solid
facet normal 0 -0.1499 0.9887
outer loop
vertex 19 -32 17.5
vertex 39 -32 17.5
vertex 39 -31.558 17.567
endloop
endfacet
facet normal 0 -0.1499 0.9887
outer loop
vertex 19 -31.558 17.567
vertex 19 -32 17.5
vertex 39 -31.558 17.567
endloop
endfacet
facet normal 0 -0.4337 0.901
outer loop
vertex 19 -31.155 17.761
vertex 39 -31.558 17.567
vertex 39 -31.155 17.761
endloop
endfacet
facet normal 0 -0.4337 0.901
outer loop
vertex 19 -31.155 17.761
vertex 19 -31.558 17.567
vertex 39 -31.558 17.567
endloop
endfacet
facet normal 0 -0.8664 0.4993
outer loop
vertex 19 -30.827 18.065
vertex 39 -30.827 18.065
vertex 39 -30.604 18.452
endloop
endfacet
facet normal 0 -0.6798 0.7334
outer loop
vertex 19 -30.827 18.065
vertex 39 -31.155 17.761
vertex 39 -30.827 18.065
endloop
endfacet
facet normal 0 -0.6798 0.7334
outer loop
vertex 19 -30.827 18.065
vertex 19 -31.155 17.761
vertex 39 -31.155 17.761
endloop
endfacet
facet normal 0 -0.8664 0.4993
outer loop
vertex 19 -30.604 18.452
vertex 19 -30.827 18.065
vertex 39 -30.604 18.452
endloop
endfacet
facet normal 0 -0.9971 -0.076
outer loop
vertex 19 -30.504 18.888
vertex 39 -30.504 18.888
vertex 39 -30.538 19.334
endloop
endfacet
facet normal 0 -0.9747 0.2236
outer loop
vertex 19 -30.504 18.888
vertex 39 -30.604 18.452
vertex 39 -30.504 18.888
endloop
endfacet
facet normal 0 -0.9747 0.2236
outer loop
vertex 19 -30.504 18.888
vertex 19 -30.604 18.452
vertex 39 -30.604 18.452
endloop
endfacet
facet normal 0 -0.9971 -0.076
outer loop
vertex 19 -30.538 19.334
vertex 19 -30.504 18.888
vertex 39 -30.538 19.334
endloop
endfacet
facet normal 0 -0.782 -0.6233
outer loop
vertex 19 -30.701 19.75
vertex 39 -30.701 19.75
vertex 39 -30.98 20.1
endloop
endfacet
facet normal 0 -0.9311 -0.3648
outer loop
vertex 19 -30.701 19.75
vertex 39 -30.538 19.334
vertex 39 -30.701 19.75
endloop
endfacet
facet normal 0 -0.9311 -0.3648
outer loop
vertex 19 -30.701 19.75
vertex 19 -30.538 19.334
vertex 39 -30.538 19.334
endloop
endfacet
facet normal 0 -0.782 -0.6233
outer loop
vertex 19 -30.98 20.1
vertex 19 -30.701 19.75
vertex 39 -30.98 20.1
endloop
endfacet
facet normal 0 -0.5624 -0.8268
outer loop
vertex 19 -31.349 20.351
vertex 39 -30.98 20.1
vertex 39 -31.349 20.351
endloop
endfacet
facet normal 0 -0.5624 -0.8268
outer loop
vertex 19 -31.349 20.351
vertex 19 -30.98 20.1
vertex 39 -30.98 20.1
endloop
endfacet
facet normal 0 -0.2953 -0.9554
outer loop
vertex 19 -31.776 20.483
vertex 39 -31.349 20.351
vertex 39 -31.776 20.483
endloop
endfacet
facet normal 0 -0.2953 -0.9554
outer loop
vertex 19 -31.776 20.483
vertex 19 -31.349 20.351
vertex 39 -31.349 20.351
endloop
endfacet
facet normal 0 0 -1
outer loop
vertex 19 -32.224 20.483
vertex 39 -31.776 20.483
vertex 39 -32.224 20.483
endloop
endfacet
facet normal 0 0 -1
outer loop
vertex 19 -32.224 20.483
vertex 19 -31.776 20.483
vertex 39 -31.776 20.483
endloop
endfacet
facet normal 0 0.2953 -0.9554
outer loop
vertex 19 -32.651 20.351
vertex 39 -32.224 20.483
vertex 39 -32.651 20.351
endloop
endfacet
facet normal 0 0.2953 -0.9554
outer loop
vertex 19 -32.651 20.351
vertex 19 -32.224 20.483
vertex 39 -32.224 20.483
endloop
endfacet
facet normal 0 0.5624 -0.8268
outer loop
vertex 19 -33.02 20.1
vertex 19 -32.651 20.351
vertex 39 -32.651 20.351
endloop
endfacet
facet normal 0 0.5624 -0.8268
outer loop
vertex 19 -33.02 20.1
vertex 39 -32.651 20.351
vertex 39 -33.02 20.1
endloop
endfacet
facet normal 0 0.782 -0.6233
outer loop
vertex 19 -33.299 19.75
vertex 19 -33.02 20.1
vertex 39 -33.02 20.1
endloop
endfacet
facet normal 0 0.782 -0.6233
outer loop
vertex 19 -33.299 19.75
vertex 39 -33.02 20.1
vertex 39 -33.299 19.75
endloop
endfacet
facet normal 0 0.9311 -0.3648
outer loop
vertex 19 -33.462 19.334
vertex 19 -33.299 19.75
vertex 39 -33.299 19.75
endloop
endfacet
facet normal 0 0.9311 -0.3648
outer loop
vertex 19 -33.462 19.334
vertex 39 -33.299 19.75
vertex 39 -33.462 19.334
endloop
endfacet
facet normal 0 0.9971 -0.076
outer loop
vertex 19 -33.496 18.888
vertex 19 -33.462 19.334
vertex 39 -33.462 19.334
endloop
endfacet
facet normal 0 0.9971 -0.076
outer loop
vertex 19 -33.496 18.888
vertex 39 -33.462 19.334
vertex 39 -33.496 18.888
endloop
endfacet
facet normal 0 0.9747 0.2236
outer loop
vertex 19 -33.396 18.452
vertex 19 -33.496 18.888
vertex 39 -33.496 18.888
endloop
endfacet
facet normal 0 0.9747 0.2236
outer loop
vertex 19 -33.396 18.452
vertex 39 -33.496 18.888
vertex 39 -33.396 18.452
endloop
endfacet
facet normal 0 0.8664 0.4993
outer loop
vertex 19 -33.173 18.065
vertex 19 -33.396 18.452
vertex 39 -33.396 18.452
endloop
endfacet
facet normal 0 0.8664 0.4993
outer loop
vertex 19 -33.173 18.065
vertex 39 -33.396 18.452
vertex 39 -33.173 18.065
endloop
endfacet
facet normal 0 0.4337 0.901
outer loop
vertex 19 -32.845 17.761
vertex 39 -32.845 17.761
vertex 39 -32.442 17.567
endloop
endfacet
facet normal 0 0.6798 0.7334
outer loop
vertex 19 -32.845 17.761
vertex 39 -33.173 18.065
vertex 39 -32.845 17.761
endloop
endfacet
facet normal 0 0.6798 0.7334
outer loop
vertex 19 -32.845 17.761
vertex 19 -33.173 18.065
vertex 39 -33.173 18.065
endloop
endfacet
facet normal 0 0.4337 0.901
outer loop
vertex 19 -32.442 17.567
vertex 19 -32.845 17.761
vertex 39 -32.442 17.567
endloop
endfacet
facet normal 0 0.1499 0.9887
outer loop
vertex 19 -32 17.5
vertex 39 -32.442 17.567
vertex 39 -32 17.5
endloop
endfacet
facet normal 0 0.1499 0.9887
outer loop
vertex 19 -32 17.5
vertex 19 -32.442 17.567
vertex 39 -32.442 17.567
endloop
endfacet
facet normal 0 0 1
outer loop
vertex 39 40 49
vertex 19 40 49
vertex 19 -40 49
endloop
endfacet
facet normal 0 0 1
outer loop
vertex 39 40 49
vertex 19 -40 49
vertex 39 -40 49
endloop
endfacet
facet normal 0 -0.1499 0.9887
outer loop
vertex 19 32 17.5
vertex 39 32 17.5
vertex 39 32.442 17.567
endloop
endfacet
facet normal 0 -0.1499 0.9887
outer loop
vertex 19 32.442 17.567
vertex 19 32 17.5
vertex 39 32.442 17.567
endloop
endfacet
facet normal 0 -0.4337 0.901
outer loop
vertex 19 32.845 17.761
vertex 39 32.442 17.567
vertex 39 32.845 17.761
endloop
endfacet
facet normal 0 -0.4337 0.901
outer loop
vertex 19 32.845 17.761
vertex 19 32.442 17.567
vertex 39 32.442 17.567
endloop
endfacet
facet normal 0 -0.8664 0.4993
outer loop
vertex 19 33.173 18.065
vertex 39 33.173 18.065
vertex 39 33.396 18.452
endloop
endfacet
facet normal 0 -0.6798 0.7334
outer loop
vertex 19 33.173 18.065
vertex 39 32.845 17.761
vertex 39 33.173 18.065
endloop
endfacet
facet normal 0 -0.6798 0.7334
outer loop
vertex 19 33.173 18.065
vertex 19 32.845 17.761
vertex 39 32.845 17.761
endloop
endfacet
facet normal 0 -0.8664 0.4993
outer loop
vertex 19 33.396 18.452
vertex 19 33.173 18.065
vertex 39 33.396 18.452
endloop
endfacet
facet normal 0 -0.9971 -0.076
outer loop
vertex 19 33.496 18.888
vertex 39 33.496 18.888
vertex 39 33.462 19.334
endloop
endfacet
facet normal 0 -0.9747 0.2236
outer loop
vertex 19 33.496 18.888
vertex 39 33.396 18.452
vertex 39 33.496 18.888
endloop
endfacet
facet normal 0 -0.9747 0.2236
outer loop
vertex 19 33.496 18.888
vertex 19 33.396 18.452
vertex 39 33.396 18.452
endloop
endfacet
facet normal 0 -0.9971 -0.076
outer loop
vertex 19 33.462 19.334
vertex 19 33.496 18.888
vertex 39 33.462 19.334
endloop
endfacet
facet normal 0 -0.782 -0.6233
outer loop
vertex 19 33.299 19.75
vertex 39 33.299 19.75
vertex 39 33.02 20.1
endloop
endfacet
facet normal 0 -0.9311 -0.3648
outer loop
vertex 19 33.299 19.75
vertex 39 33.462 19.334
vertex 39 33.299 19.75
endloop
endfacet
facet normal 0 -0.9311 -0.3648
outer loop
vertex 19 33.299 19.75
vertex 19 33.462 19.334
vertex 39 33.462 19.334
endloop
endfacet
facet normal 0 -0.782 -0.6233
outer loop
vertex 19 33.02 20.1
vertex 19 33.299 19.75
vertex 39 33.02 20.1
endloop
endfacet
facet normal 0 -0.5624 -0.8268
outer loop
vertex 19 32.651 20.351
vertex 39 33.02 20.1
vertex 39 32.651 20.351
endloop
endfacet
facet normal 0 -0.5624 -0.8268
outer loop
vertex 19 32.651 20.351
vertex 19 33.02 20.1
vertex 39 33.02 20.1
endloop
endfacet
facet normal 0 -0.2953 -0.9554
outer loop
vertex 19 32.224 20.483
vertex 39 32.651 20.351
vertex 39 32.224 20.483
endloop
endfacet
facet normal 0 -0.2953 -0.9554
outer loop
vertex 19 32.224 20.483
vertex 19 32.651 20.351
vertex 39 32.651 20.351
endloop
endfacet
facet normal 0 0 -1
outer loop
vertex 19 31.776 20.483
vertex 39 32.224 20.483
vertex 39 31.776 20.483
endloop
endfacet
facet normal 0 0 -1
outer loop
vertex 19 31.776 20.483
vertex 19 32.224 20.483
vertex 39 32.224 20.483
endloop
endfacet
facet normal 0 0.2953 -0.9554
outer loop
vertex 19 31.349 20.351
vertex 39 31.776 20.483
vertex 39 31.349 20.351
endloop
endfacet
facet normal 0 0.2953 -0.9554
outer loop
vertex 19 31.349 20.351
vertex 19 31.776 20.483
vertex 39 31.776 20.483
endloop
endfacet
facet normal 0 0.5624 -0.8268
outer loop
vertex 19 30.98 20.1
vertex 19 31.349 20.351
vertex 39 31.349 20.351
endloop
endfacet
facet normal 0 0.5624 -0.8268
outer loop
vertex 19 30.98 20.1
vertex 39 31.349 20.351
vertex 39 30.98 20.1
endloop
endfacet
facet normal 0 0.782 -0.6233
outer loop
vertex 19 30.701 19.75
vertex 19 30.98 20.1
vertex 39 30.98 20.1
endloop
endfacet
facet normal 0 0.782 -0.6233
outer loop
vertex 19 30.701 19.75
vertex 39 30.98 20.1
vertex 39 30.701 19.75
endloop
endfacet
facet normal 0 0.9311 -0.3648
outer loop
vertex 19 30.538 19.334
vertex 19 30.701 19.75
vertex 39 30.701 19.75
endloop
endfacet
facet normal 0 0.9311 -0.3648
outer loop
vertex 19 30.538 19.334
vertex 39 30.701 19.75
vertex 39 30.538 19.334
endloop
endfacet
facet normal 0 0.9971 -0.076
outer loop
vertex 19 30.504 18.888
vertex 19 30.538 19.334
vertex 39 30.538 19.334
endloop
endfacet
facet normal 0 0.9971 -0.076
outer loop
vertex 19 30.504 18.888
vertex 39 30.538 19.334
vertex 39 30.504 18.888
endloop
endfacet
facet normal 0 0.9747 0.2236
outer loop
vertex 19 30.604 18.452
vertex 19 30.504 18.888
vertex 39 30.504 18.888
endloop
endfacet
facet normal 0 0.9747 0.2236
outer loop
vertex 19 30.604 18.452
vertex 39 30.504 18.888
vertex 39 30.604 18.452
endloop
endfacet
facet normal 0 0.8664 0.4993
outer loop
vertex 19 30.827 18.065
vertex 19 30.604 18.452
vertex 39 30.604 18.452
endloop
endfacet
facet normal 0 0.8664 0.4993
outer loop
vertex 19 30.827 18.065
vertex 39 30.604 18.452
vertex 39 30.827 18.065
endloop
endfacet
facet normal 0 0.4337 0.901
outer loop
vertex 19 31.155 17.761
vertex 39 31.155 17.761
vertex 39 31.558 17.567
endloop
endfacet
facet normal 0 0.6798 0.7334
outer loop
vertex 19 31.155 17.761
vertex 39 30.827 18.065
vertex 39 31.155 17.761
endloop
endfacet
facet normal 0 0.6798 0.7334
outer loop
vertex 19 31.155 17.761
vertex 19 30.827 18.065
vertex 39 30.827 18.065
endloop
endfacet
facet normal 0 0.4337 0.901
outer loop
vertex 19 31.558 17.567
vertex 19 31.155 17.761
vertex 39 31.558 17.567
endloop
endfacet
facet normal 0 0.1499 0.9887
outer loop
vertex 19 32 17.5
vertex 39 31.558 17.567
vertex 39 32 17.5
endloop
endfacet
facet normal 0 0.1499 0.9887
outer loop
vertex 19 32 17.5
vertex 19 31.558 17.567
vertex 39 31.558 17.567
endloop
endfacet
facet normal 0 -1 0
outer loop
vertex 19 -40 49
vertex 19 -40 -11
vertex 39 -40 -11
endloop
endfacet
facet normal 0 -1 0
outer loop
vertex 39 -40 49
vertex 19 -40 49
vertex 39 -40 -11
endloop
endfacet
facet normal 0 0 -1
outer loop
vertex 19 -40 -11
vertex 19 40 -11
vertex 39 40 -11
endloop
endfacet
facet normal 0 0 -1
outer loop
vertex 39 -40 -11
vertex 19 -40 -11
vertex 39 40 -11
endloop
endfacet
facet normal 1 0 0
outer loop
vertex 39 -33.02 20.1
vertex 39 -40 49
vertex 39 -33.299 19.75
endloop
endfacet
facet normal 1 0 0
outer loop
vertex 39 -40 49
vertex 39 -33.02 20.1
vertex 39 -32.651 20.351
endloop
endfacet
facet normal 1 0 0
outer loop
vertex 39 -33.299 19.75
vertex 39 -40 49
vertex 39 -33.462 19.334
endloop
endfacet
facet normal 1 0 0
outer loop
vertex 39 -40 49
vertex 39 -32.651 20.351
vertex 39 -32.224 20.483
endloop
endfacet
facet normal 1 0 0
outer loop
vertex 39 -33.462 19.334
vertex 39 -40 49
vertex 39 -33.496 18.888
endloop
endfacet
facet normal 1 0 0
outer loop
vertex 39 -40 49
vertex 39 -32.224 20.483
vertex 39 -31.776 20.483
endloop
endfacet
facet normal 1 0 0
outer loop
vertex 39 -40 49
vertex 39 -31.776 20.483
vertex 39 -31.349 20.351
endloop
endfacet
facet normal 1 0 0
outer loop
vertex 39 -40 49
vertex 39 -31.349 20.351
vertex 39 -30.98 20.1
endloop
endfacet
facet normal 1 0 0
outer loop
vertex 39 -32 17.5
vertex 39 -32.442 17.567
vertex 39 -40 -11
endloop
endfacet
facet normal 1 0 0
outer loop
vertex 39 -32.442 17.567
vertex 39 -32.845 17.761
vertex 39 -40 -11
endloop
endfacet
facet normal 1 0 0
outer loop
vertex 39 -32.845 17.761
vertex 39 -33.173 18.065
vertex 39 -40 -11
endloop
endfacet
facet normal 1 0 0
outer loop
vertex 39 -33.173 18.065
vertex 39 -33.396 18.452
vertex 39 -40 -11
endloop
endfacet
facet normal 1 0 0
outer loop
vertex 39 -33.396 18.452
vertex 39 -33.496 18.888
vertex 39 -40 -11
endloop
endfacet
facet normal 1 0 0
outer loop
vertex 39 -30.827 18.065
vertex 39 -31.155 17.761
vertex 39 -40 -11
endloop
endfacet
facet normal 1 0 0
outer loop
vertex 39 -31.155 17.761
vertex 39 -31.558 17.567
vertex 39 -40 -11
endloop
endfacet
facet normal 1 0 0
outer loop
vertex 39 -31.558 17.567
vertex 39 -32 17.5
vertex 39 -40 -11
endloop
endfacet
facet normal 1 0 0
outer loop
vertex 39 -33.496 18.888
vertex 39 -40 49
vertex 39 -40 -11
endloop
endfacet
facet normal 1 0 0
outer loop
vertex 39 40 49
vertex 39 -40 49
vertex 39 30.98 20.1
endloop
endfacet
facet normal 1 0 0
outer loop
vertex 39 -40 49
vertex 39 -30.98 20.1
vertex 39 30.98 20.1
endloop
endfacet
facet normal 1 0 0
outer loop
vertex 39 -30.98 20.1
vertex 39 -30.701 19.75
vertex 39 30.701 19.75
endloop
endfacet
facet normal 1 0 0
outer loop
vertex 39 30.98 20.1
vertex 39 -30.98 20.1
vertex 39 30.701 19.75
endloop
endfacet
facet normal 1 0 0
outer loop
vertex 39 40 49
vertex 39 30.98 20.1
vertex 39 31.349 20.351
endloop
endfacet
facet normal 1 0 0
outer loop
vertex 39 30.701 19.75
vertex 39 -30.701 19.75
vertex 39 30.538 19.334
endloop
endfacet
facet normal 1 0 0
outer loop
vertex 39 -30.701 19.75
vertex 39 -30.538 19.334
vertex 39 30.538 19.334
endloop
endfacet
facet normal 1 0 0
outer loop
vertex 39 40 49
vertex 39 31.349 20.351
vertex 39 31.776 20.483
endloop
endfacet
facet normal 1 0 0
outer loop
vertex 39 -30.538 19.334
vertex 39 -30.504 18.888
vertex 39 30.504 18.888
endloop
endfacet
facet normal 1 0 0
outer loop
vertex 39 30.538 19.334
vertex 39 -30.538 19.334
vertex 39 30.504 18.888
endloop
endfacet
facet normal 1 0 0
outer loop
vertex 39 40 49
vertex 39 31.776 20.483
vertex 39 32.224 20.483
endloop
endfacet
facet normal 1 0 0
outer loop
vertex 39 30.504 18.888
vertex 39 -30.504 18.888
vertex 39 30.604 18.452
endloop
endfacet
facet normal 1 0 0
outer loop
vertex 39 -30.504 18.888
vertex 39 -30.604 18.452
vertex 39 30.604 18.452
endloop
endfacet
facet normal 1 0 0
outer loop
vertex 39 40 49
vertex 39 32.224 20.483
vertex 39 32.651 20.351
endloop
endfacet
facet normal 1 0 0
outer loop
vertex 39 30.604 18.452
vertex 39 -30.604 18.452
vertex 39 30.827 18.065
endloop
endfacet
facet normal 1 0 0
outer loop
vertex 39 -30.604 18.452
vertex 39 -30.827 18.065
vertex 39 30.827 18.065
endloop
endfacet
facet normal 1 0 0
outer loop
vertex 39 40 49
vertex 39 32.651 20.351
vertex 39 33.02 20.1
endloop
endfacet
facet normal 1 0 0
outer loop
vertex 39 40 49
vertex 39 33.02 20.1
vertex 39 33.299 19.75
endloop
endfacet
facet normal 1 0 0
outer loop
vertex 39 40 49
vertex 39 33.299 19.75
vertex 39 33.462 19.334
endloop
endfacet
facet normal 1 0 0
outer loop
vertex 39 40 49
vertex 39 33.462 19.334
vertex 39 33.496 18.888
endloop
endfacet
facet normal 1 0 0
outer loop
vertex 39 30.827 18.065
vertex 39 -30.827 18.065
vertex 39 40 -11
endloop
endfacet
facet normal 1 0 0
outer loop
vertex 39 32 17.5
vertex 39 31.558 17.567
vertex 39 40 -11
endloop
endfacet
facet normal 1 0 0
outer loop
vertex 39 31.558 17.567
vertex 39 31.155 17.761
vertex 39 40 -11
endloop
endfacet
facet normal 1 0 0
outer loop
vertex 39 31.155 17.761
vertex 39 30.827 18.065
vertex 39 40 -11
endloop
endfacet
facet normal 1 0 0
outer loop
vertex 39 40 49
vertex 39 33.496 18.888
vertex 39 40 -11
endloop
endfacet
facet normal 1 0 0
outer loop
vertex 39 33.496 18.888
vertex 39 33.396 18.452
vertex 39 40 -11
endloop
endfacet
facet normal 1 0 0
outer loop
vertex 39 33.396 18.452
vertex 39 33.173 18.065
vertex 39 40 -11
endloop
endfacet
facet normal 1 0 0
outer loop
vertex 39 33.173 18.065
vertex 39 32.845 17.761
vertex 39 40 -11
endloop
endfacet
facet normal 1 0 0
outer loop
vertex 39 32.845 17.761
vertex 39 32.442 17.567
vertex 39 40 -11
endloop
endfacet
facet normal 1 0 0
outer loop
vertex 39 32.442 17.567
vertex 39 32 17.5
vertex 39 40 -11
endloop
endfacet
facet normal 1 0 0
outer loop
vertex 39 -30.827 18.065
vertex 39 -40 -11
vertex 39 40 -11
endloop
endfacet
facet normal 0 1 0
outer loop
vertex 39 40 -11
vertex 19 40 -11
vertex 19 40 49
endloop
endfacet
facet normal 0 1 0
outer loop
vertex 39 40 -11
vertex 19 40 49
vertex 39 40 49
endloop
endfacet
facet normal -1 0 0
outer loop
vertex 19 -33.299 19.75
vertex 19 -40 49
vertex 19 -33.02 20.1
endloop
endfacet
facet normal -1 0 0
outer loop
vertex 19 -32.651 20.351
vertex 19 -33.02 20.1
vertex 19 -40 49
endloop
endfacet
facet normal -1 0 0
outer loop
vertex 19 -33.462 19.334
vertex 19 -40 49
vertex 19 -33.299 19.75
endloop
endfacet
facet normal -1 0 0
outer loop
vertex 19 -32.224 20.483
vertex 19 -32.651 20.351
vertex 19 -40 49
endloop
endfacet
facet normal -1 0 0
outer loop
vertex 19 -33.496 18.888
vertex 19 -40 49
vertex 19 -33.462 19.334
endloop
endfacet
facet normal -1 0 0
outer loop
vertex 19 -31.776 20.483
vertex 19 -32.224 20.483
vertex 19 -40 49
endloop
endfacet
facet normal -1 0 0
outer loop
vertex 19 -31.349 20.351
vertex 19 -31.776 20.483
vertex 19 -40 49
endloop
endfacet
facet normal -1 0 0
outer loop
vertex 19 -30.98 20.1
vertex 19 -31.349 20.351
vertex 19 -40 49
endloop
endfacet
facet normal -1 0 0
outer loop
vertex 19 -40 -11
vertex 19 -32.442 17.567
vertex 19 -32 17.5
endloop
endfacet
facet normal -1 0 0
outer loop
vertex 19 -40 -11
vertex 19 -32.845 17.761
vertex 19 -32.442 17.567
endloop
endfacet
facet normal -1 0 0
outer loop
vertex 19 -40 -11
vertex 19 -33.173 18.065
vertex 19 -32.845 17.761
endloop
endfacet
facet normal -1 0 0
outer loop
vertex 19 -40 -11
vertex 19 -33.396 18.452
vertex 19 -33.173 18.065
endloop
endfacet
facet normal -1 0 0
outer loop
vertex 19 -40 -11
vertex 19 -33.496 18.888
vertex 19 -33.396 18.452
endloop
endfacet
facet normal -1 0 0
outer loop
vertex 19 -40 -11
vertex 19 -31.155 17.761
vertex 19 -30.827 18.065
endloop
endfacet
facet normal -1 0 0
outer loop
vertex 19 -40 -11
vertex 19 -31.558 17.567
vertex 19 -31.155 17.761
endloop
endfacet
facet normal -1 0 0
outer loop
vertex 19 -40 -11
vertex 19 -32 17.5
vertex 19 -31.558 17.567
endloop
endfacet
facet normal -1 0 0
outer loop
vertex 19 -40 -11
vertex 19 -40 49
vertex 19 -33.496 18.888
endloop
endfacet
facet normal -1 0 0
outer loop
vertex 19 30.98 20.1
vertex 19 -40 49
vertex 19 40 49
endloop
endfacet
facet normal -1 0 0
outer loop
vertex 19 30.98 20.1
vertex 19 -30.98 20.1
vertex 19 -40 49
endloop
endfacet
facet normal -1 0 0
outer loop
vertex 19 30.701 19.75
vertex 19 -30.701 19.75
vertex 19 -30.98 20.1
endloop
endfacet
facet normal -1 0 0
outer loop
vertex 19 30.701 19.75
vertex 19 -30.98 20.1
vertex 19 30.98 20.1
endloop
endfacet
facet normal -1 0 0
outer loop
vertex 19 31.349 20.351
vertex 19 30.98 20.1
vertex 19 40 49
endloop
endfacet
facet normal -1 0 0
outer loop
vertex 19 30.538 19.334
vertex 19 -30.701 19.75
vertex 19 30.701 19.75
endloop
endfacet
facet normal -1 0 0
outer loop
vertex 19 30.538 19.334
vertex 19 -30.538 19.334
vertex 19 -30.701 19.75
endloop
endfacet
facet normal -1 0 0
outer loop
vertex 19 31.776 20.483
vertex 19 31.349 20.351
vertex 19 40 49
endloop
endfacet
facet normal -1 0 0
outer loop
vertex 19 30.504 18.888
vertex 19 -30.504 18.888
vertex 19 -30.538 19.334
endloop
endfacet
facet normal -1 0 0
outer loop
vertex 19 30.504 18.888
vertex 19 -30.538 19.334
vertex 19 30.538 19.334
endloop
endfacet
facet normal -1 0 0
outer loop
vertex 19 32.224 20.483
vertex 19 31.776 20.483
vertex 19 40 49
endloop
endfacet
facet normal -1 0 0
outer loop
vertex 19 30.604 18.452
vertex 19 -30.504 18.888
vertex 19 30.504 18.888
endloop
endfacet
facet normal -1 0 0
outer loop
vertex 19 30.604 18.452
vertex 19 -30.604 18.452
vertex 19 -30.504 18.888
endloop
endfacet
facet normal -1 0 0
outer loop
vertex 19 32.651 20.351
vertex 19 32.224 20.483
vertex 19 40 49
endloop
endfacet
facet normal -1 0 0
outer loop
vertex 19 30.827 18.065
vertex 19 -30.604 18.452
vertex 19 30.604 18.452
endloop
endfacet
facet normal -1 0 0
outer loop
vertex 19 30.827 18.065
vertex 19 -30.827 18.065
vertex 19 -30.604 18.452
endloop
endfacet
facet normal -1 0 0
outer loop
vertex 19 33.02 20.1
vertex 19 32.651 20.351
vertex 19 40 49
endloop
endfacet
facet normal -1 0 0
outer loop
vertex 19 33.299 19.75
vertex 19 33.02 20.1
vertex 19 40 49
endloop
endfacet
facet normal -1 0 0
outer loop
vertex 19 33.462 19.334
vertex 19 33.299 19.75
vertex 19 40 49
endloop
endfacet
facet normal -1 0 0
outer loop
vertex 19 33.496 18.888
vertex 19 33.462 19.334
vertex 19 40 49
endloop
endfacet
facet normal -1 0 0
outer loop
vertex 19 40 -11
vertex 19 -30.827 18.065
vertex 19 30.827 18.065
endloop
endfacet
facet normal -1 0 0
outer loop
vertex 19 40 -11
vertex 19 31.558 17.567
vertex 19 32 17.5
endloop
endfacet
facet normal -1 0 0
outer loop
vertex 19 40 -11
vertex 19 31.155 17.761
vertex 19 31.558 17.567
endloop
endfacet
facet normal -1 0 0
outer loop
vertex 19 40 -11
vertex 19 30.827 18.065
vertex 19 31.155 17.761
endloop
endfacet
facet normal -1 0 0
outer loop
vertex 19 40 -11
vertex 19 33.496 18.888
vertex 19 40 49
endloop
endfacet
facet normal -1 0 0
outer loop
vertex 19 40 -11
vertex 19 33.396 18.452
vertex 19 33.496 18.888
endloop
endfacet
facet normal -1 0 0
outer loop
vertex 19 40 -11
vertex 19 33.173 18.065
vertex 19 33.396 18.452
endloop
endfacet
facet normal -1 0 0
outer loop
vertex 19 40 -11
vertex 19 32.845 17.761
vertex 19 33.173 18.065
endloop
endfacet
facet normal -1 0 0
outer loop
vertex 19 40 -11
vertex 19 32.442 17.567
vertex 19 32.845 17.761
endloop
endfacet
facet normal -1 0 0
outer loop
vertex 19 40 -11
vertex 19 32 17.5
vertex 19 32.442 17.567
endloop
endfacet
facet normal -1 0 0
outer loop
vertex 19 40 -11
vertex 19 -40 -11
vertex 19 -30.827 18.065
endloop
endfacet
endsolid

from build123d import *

# Parameters (mm, degrees)
CYLINDER075_R     = 1.5
CYLINDER075_DEPTH = 50
CYLINDER076_R     = 1.5
CYLINDER076_DEPTH = 50
BOX001_W          = 20
BOX001_H          = 80
BOX001_DEPTH      = 60


with BuildPart() as cilindro075:
    # Cylinder075 → Cylinder075 (new body)
    with BuildSketch(Plane(origin=(-8, 8, 30), x_dir=(0, 0, -1), z_dir=(1, 0, 0))):
        Circle(CYLINDER075_R)
    extrude(amount=CYLINDER075_DEPTH)


with BuildPart() as fusion037:
    # Cylinder076 → Cylinder076 (new body)
    with BuildSketch(Plane(origin=(-8, 72, 30), x_dir=(0, 0, -1), z_dir=(1, 0, 0))):
        Circle(CYLINDER076_R)
    extrude(amount=CYLINDER076_DEPTH)

    # Fusion037: union Cilindro075
    add(cilindro075.part)


with BuildPart() as portapilasx5:
    # Box001 → Box001 (new body)
    with BuildSketch(Plane.XY):
        with Locations((10, 40)):
            Rectangle(BOX001_W, BOX001_H)
    extrude(amount=BOX001_DEPTH)

    # Cut001: cut Fusion037
    add(fusion037.part, mode=Mode.SUBTRACT)


with BuildPart() as portapilasx5_1:
    # Cut001 placement: moved
    add(portapilasx5.part.moved(Location((19, -40, -11))))


solid = portapilasx5_1.part
